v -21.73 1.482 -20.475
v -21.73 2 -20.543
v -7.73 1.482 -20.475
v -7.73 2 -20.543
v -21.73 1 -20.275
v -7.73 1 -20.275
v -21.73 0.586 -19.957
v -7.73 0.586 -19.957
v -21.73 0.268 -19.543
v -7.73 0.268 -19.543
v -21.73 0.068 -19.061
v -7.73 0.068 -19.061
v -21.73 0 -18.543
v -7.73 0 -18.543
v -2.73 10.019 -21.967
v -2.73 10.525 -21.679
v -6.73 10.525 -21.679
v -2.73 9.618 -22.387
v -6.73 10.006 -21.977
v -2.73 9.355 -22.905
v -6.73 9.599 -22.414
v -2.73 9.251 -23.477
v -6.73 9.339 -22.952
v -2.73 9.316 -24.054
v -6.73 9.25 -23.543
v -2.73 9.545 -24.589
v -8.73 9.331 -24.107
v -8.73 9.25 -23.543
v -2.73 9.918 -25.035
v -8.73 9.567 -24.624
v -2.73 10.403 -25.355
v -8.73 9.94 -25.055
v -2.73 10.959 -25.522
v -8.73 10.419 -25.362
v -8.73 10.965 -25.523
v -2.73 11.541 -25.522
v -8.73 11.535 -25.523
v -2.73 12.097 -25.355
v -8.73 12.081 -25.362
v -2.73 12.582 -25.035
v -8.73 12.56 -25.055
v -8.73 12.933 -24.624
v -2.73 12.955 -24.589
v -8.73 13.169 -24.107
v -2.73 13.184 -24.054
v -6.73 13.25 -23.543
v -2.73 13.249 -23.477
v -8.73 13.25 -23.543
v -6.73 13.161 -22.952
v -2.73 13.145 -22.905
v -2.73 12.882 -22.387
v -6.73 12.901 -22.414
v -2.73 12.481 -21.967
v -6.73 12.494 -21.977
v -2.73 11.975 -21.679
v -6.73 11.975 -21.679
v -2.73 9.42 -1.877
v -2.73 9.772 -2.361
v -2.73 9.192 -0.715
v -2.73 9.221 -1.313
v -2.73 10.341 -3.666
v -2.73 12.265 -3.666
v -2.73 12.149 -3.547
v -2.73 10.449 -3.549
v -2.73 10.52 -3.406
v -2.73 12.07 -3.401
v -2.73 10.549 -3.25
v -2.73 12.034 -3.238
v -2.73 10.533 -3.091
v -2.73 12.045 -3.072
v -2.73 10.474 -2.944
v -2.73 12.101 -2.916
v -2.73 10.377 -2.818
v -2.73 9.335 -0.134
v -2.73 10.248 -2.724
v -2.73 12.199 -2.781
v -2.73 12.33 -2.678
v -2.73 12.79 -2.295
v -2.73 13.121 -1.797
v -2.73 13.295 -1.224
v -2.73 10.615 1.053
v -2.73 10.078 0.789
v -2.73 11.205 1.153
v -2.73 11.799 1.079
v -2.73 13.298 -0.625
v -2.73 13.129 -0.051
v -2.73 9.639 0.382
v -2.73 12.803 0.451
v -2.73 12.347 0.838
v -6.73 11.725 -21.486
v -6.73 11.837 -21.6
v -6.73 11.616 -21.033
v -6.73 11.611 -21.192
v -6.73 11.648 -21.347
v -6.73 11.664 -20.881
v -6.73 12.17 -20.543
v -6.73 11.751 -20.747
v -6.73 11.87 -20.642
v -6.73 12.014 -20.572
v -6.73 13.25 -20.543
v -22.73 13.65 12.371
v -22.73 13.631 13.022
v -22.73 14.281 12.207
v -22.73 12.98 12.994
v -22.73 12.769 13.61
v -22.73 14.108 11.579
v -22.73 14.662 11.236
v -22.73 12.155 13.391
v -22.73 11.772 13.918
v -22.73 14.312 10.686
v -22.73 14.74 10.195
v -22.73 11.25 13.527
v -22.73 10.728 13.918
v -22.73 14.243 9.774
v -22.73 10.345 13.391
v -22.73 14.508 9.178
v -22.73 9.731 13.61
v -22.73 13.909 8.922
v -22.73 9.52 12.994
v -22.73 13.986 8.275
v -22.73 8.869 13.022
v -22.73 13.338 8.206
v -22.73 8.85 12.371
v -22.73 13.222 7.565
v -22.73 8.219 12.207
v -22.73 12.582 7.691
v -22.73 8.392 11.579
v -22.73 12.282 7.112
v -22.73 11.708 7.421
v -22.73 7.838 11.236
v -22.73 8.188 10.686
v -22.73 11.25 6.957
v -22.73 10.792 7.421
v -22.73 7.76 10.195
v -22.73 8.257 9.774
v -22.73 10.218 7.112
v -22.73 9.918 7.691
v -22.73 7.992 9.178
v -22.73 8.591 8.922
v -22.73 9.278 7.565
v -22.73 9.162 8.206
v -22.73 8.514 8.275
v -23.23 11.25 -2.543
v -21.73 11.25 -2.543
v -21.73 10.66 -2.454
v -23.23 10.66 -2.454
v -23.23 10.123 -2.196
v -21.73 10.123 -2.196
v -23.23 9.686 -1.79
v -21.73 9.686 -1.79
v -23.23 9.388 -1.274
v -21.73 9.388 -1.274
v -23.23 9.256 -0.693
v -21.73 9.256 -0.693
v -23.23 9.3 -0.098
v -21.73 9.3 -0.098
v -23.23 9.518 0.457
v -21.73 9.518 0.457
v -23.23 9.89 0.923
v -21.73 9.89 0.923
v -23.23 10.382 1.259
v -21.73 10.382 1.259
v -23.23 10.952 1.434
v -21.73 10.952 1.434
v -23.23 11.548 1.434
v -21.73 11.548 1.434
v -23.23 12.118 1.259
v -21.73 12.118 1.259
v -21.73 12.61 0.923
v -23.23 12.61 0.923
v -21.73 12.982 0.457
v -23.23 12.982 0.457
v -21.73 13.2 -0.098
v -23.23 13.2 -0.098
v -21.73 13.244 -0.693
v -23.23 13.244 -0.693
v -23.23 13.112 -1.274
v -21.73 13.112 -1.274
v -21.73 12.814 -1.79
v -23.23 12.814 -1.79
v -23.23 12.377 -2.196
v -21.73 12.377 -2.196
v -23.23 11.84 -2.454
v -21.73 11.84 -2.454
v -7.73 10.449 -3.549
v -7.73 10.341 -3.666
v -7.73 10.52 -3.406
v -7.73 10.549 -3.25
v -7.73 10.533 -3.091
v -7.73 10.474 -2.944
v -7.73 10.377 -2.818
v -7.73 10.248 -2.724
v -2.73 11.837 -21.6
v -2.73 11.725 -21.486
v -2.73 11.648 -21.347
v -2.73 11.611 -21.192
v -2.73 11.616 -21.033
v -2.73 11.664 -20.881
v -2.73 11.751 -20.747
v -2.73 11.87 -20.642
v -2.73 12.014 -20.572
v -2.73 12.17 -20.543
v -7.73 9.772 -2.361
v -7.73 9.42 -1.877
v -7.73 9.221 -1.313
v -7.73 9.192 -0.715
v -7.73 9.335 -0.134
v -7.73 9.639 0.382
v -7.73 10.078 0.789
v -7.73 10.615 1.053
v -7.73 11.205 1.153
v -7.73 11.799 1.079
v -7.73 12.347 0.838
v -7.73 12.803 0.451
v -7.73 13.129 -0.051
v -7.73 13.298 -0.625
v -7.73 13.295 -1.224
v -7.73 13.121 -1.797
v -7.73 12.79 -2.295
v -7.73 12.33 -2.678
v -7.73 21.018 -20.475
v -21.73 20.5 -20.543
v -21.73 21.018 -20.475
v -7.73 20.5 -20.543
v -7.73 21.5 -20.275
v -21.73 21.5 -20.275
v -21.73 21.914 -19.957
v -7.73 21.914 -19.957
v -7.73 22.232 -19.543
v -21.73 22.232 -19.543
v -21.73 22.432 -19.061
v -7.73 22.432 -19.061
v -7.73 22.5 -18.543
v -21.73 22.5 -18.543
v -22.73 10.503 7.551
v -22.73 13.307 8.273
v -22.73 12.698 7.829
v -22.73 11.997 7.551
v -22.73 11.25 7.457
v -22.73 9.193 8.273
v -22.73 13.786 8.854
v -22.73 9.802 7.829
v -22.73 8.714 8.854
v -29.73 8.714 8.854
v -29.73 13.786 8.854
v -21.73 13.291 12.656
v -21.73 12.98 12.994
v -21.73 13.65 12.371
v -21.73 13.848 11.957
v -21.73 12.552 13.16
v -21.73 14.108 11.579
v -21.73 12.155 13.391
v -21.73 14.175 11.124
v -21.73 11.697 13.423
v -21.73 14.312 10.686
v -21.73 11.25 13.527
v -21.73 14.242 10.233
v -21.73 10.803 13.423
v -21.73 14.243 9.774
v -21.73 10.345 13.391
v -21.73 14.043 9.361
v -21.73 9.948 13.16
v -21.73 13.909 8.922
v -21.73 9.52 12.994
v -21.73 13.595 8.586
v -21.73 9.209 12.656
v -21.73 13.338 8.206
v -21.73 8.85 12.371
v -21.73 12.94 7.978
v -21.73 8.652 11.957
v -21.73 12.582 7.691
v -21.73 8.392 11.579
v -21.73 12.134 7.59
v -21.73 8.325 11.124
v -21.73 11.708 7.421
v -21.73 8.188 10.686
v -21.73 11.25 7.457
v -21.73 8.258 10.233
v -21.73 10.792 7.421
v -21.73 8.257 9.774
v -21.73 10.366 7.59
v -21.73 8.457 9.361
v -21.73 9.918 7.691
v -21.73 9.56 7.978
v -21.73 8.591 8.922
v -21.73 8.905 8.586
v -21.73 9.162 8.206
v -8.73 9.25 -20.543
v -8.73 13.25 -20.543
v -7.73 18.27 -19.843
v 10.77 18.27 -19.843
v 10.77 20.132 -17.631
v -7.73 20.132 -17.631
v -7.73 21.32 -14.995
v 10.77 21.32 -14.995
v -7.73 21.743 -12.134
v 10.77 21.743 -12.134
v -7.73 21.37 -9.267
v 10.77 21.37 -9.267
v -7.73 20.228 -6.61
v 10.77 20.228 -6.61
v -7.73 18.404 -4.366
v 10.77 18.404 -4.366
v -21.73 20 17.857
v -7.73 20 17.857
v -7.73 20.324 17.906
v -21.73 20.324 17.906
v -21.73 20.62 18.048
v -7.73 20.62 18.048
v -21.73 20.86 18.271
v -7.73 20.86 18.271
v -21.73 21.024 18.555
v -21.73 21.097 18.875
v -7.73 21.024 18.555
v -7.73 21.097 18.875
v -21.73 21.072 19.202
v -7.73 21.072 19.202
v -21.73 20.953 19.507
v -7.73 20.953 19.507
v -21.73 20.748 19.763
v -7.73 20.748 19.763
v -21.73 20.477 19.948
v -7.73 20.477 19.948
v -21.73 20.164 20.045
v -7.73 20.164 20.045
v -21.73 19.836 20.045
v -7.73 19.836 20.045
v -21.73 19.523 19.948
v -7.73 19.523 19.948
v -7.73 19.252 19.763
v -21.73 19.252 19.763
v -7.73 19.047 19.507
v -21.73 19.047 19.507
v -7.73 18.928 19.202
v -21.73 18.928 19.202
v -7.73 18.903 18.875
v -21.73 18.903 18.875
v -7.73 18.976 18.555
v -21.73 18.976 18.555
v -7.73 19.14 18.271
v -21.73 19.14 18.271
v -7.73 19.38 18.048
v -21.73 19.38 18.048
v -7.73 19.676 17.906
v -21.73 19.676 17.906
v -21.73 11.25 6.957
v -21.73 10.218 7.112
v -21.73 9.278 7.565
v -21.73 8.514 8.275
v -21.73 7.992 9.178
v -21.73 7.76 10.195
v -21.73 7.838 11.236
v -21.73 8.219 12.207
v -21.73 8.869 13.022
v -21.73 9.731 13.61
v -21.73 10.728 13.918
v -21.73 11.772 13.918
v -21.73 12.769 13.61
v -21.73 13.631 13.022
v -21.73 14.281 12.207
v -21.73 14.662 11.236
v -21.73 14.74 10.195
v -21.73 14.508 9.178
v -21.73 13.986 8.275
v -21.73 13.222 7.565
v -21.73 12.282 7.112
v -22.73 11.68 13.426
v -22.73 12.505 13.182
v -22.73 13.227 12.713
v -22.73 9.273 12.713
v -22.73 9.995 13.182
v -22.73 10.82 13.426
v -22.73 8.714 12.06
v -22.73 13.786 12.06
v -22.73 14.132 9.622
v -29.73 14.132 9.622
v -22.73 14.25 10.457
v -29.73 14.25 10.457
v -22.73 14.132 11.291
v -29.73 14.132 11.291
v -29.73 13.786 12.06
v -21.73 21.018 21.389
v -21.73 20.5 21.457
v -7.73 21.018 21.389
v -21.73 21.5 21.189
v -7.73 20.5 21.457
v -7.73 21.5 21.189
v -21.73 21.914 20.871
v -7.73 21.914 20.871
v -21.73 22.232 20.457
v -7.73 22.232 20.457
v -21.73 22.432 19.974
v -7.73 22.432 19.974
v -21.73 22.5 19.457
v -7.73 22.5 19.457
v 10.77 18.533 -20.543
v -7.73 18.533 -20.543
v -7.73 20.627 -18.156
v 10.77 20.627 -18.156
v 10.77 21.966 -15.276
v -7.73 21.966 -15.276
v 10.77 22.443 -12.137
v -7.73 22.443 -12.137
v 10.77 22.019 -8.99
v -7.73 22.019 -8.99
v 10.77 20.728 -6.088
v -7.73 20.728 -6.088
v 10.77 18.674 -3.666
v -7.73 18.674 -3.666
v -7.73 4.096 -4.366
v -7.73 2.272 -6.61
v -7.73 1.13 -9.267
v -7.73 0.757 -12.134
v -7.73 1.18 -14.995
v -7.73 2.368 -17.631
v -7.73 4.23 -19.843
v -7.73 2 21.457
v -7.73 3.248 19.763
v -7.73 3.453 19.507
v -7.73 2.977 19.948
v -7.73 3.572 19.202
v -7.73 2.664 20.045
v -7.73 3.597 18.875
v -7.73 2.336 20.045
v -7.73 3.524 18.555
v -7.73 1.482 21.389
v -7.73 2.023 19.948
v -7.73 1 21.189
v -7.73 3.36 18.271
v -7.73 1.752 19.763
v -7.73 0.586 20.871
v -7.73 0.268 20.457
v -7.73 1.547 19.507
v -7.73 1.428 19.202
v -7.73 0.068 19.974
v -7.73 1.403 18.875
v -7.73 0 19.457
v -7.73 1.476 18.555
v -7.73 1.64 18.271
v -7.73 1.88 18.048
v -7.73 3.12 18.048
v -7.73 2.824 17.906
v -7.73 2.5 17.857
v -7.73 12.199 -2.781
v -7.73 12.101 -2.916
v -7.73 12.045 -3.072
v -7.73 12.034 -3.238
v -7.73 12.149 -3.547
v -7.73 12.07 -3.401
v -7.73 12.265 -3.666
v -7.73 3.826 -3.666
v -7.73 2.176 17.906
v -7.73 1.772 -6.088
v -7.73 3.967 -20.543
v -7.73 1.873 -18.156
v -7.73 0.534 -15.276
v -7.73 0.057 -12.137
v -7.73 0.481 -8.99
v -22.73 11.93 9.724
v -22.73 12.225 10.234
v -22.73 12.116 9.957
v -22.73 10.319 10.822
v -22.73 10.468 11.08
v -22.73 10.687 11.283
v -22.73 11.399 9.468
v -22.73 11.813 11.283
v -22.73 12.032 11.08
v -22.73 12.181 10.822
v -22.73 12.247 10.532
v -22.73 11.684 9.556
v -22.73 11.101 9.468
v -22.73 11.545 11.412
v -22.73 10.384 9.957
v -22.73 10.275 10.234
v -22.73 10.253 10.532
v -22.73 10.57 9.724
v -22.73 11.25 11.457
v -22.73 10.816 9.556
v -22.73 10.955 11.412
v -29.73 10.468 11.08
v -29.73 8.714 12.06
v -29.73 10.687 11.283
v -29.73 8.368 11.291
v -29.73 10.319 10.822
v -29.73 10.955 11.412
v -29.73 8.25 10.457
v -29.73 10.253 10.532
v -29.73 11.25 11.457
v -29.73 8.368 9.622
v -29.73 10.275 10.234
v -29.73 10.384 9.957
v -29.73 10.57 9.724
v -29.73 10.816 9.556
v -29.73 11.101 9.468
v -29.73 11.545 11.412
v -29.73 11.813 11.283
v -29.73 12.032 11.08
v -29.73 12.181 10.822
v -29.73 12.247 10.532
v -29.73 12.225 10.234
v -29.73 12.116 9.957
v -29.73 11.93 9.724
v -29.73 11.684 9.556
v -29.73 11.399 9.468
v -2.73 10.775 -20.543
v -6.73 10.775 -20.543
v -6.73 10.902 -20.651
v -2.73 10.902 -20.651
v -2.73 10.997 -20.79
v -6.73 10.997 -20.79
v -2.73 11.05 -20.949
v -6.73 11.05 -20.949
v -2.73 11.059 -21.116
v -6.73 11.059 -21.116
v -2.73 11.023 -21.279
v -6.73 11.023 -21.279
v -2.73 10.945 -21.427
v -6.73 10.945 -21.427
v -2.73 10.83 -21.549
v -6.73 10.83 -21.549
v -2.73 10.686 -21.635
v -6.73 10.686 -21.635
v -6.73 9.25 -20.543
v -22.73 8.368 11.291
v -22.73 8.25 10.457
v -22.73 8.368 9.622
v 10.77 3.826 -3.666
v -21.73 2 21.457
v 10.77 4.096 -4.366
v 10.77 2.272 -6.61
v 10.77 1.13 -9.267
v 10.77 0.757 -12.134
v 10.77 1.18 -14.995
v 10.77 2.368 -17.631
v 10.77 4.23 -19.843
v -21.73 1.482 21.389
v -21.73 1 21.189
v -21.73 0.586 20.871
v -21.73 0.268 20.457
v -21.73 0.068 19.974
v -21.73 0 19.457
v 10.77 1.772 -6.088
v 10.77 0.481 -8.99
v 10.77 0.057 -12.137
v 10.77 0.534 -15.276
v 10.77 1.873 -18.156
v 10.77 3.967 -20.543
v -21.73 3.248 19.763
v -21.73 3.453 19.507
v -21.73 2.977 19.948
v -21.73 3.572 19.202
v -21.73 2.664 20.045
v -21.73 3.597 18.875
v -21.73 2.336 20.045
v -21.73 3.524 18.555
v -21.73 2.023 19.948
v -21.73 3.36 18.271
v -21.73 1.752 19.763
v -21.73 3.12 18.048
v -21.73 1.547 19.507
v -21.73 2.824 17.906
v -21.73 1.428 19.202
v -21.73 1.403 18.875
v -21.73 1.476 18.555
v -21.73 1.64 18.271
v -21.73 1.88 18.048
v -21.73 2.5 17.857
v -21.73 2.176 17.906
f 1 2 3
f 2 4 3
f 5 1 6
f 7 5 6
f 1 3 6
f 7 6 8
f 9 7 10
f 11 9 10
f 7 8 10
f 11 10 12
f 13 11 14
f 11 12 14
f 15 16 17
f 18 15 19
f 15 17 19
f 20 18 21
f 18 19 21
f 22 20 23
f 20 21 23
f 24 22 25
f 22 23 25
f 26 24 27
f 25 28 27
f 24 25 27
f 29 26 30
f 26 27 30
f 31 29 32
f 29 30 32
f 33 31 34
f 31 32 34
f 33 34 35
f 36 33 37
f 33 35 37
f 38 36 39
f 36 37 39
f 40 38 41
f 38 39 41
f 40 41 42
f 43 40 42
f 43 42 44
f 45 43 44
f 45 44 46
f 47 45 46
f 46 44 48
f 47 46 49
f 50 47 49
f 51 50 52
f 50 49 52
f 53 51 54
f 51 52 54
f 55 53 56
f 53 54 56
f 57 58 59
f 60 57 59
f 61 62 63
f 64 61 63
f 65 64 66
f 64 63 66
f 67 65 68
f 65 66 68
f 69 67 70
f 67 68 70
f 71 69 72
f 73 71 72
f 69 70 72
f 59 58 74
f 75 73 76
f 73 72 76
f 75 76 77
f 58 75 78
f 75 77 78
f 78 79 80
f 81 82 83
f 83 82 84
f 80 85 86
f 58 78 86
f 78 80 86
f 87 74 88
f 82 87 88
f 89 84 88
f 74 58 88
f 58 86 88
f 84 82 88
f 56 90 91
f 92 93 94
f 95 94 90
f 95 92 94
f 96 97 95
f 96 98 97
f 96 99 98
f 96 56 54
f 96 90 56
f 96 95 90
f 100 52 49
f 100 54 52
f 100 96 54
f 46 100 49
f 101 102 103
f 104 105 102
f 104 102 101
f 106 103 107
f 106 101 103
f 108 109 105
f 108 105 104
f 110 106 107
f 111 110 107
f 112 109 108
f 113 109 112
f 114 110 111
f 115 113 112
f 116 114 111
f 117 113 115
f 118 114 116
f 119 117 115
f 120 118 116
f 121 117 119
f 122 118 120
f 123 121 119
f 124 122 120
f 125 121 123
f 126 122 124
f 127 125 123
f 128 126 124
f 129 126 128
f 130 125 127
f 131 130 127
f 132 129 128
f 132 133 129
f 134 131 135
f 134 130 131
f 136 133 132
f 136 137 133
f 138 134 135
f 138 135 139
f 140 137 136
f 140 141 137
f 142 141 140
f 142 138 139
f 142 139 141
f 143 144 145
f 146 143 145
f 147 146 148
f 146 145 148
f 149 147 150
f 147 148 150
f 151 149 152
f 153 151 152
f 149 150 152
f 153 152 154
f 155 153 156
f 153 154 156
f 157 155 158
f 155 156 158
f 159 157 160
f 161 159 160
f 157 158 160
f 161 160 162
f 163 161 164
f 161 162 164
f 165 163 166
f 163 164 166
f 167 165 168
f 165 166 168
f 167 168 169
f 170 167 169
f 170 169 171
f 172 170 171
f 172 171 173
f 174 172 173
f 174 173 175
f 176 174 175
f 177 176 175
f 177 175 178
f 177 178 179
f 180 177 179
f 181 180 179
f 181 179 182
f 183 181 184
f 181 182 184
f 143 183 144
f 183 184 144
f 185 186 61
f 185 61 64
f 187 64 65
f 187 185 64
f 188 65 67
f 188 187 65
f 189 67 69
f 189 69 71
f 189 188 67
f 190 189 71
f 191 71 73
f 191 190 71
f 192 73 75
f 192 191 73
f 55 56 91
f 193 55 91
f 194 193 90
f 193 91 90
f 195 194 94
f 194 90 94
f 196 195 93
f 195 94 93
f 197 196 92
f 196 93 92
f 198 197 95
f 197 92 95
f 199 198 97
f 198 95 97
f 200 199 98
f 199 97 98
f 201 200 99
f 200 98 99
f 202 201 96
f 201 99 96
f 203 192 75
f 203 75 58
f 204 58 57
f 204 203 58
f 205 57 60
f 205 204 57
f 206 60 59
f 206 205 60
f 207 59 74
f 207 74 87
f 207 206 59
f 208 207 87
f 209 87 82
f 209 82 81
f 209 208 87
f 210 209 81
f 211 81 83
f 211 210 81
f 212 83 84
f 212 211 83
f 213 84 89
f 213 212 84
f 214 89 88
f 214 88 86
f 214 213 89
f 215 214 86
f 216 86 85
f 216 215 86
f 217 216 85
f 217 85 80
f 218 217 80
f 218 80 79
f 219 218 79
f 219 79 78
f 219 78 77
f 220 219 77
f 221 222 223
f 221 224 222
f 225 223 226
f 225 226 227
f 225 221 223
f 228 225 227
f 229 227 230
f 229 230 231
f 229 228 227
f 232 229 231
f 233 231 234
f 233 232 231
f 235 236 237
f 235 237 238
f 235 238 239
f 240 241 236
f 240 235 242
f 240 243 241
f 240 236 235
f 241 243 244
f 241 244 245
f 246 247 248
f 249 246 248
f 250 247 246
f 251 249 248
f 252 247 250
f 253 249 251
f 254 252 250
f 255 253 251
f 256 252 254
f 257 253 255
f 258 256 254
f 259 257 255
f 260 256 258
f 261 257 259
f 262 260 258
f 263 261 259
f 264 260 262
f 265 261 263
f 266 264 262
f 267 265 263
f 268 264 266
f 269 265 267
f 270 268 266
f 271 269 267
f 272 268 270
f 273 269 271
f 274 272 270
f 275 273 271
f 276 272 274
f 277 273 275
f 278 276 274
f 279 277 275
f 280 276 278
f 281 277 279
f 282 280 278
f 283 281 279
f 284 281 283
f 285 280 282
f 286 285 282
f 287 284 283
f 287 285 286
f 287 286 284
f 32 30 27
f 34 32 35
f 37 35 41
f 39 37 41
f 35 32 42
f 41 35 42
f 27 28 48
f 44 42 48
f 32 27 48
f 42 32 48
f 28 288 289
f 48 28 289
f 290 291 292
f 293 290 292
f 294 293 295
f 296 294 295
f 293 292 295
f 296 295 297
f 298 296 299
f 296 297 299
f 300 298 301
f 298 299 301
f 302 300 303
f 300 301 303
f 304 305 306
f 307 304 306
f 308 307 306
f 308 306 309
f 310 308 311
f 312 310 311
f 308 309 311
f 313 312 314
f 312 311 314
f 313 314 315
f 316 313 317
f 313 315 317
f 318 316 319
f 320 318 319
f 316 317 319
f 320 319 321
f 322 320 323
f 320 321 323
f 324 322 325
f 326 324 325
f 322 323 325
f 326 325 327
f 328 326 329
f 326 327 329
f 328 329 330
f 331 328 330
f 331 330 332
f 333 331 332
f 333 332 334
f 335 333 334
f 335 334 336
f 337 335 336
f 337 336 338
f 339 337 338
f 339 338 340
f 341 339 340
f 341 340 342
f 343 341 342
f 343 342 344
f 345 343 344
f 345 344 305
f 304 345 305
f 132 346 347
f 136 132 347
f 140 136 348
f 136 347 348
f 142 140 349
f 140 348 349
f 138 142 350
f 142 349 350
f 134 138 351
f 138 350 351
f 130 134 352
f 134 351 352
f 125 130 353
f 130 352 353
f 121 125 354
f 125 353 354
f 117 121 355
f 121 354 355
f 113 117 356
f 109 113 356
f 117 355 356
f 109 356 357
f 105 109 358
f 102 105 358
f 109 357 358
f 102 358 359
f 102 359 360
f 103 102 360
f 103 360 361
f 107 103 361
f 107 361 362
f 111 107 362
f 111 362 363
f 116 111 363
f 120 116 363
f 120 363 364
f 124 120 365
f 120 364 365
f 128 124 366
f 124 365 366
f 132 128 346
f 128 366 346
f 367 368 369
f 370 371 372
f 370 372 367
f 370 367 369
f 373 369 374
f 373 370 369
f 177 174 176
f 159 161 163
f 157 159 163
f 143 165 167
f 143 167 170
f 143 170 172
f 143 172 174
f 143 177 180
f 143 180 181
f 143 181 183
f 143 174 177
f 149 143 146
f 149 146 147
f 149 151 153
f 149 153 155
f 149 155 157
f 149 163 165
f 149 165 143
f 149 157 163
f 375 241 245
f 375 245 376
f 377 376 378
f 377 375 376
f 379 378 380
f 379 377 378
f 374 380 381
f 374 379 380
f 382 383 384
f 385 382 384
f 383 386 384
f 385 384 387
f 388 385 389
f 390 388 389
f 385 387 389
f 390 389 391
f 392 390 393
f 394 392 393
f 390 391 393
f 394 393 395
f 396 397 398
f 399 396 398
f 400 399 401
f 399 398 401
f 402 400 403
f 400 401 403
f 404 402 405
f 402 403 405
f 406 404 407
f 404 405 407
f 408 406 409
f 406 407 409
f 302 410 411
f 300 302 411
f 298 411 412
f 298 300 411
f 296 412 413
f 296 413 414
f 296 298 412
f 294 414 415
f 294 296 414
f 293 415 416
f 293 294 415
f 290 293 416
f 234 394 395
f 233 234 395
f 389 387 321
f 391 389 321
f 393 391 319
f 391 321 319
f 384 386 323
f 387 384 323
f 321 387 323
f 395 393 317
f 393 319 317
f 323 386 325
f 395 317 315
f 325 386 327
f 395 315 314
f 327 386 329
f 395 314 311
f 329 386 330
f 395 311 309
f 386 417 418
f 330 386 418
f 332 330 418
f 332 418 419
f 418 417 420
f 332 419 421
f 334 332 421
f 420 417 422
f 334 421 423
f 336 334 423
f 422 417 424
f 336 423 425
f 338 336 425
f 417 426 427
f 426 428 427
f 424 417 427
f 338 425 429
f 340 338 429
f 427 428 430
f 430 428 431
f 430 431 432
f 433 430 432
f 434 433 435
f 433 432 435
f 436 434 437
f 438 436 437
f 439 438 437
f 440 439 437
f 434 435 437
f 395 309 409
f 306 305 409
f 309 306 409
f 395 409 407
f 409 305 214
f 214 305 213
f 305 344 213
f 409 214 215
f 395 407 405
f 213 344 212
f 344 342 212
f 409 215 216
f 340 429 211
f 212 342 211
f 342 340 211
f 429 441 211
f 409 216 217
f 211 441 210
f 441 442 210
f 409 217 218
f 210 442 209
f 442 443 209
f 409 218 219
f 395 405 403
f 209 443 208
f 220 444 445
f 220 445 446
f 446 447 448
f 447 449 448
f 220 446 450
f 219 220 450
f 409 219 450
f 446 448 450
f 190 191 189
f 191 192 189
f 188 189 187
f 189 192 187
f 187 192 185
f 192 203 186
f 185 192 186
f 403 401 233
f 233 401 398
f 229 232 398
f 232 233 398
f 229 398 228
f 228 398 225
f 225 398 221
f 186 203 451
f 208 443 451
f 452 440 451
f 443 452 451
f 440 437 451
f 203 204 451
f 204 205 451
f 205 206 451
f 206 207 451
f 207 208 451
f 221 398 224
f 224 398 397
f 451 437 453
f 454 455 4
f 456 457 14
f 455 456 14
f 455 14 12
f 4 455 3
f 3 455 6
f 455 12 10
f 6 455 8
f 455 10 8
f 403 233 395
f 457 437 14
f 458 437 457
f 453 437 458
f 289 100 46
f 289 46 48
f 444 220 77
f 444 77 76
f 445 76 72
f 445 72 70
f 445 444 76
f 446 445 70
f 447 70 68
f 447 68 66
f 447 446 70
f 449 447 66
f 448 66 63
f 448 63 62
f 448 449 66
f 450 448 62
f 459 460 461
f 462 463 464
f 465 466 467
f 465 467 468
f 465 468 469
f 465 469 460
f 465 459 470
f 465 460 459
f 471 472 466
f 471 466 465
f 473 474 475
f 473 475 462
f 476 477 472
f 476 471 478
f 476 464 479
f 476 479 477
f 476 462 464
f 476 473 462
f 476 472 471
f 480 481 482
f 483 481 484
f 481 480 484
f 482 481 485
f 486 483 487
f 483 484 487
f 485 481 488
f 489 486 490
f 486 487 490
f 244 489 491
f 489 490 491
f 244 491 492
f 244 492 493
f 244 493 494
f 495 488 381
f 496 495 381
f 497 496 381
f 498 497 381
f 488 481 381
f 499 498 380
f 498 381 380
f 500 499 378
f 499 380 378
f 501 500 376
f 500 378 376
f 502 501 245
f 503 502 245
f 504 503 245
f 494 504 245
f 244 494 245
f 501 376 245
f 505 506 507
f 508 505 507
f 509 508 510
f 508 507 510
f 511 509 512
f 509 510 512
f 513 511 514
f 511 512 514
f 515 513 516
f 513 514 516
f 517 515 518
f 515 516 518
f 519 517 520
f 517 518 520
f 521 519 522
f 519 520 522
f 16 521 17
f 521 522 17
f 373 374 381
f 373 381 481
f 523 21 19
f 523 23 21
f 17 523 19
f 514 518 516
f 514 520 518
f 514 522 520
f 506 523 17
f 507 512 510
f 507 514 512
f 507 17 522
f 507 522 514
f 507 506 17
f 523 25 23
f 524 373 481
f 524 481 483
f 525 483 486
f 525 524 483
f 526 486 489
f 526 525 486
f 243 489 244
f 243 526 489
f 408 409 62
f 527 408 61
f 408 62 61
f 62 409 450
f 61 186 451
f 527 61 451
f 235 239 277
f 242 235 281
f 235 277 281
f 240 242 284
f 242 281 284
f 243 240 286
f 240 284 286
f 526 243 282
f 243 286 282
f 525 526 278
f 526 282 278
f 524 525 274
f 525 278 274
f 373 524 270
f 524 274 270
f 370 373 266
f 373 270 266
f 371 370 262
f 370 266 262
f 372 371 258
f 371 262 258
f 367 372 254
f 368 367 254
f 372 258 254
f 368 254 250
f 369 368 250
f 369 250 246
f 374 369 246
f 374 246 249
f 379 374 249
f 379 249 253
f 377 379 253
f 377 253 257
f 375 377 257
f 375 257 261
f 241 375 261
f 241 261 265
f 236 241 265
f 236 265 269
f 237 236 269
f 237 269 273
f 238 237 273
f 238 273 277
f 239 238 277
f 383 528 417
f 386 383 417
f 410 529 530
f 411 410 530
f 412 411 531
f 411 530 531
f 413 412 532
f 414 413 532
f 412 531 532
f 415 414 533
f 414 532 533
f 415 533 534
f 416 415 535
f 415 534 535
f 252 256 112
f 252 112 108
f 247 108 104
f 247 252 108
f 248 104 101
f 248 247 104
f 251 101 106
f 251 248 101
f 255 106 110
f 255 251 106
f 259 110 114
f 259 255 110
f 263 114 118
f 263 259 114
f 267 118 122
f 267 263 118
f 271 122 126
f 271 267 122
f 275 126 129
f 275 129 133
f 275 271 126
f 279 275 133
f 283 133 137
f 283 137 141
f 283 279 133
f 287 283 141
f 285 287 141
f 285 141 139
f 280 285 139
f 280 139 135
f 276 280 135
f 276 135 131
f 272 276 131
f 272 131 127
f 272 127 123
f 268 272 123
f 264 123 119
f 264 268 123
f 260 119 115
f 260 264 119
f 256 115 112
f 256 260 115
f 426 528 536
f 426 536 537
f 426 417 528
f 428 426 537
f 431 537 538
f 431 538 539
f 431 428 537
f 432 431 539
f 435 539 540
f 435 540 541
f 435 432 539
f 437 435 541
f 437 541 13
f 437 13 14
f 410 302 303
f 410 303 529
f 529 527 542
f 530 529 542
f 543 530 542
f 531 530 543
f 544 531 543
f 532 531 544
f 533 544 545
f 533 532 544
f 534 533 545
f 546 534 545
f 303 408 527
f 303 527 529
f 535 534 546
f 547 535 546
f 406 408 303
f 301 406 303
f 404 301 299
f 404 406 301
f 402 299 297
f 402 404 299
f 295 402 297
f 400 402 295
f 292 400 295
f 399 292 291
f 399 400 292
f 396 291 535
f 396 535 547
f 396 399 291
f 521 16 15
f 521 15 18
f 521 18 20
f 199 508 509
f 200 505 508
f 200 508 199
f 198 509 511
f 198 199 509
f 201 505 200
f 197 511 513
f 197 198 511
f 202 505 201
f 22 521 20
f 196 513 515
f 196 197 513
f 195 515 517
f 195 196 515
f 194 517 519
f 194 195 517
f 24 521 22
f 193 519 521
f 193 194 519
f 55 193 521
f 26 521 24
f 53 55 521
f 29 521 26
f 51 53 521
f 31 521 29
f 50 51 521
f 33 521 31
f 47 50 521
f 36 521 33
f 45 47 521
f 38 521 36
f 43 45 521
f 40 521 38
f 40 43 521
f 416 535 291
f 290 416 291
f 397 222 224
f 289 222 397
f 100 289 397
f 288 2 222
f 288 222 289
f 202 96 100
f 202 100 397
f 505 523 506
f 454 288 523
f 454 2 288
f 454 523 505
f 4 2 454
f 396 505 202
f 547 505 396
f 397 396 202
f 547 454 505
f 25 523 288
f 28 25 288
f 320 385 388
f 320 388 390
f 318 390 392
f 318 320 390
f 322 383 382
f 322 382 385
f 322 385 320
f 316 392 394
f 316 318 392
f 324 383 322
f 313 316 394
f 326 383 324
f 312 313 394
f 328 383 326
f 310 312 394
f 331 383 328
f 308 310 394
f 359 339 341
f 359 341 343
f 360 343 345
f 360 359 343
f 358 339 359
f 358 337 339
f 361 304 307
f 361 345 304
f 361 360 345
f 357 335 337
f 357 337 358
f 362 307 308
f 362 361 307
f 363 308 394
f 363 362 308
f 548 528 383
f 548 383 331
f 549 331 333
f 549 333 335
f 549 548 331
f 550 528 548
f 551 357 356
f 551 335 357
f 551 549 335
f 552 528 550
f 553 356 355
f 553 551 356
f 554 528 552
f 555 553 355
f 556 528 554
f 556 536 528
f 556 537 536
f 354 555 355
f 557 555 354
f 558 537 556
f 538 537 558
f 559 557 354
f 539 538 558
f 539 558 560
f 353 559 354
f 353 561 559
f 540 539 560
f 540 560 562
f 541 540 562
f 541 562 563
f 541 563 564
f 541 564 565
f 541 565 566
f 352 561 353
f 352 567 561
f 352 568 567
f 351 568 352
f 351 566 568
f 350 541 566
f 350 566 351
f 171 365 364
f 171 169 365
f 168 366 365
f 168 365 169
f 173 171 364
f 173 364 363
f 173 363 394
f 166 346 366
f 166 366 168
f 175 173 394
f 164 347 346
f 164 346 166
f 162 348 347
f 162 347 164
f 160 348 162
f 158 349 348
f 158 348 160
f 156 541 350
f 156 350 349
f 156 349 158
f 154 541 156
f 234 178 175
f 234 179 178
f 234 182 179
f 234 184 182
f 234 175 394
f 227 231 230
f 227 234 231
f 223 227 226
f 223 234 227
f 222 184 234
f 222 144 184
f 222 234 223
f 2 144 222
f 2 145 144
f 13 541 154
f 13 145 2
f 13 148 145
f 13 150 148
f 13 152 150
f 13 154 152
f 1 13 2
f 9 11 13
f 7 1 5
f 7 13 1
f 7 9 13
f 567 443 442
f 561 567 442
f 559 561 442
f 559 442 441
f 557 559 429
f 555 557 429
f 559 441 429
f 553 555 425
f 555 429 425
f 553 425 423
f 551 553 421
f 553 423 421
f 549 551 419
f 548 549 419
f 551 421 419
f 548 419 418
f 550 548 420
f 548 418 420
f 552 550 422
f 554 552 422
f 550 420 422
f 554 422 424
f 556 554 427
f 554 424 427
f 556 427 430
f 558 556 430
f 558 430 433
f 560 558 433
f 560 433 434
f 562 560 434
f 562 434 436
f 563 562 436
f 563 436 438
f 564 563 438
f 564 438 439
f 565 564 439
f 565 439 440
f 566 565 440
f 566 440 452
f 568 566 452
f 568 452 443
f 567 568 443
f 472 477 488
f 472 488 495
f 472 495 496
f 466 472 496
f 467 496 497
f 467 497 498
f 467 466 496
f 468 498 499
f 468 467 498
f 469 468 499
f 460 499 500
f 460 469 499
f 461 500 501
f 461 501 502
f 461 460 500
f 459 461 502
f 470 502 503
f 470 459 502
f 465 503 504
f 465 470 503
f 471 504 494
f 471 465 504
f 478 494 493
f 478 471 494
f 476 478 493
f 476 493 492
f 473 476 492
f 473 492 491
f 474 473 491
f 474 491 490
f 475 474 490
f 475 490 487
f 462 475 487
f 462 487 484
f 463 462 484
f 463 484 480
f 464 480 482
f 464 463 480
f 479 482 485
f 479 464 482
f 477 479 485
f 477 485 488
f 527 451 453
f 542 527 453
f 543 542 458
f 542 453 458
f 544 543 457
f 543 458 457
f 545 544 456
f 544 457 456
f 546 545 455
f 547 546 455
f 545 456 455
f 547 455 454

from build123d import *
from build123d.topology import SkipClean

# Parameters (mm, degrees)
SKETCH1_W           = 14
SKETCH1_H           = 42
BOSS_EXTRUDE1_DEPTH = 22.5
FILLET1_R           = 2
BOSS_EXTRUDE2_DEPTH = 18.5
BOSS_EXTRUDE3_DEPTH = 5
SKETCH4_R           = 1.1
CUT_EXTRUDE1_DEPTH  = 15
SKETCH5_W           = 2
SKETCH5_H           = 4
BOSS_EXTRUDE4_DEPTH = 5
BOSS_EXTRUDE5_DEPTH = 4
CUT_EXTRUDE2_START  = -2
CUT_EXTRUDE2_DEPTH  = 2
SKETCH12_R          = 3.5
SKETCH12_R_2        = 3.070336519
BOSS_EXTRUDE6_DEPTH = 1
SKETCH14_R          = 3
BOSS_EXTRUDE7_DEPTH = 1
SKETCH15_R          = 1
BOSS_EXTRUDE8_DEPTH = 7
SKETCH16_R          = 2
BOSS_EXTRUDE9_DEPTH = 1.5
CUT_EXTRUDE3_DEPTH  = 18.5


with BuildPart() as part:
    # Sketch1 → Boss-Extrude1 (new body)
    with BuildSketch(Plane(origin=(0, 0, 0), x_dir=(1, 0, 0), z_dir=(0, 1, 0))):
        with Locations((-14.72963025, -0.456790856)):
            Rectangle(SKETCH1_W, SKETCH1_H)
    extrude(amount=BOSS_EXTRUDE1_DEPTH)

    # Fillet1
    fillet1_edges = [part.edges().sort_by_distance(p)[0] for p in [
        (-14.72963025, 22.5, -20.543209144),
        (-14.72963025, 0, -20.543209144),
        (-14.72963025, 0, 21.456790856),
        (-14.72963025, 22.5, 21.456790856),
    ]]
    fillet(fillet1_edges, radius=FILLET1_R)

    # Sketch2 → Boss-Extrude2 (add)
    with BuildSketch(Plane(origin=(-7.72963025, 0, 0), x_dir=(0, 0, -1), z_dir=(1, 0, 0))):
        with BuildLine():
            Line((3.666133326, 18.67433994), (3.666133326, 3.82566006))
            ThreePointArc((3.666133326, 3.82566006), (12.136760187, 0.056811401), (20.543209144, 3.966716207))
            Line((20.543209144, 3.966716207), (20.543209144, 18.533283793))
            ThreePointArc((20.543209144, 18.533283793), (12.136760187, 22.443188599), (3.666133326, 18.67433994))
        make_face()
    extrude(amount=BOSS_EXTRUDE2_DEPTH)

    # Sketch3 → Boss-Extrude3 (add)
    with BuildSketch(Plane(origin=(-7.72963025, 0, 0), x_dir=(0, 0, -1), z_dir=(1, 0, 0))):
        with BuildLine():
            Line((3.666133326, 12.265446457), (3.666133326, 10.341158941))
            ThreePointArc((3.666133326, 10.341158941), (3.170141933, 10.546427574), (2.72390333, 10.248075799))
            ThreePointArc((2.72390333, 10.248075799), (-1.152649836, 11.204898318), (2.678489822, 12.329861741))
            ThreePointArc((2.678489822, 12.329861741), (3.155102255, 12.033793242), (3.666133326, 12.265446457))
        make_face()
    extrude(amount=BOSS_EXTRUDE3_DEPTH)

    # Sketch4 → Cut-Extrude1 (cut)
    with BuildSketch(Plane(origin=(-7.72963025, 0, 0), x_dir=(0, 0, -1), z_dir=(1, 0, 0))):
        with Locations((-18.956790856, 20)):
            Circle(SKETCH4_R)
        with Locations((-18.956790856, 2.5)):
            Circle(SKETCH4_R)
    extrude(amount=-CUT_EXTRUDE1_DEPTH, mode=Mode.SUBTRACT)

    # Sketch5 → Boss-Extrude4 (add)
    with BuildSketch(Plane(origin=(0, 0, -20.543209144), x_dir=(-1, 0, 0), z_dir=(0, 0, -1))):
        with Locations((7.72963025, 11.25)):
            Rectangle(SKETCH5_W, SKETCH5_H)
    extrude(amount=BOSS_EXTRUDE4_DEPTH)

    # Sketch6 → Boss-Extrude5 (add)
    with BuildSketch(Plane(origin=(-6.72963025, 0, 0), x_dir=(0, 0, -1), z_dir=(1, 0, 0))):
        with BuildLine():
            ThreePointArc((21.679339079, 11.975250565), (21.032871281, 11.616126027), (20.543209144, 12.17031195))
            Line((20.543209144, 12.17031195), (20.543209144, 10.774749435))
            ThreePointArc((20.543209144, 10.774749435), (21.198638933, 11.046780591), (21.679339079, 10.524749435))
            ThreePointArc((21.679339079, 10.524749435), (25.543209144, 11.25), (21.679339079, 11.975250565))
        make_face()
    extrude(amount=BOSS_EXTRUDE5_DEPTH)

    # Sketch7 → Cut-Extrude2 (cut)
    with BuildSketch(Plane(origin=(-6.72963025, 0, 0), x_dir=(0, 0, -1), z_dir=(1, 0, 0)).offset(CUT_EXTRUDE2_START)):
        with BuildLine():
            Line((23.543209144, 13.25), (23.543209144, 13.967200788))
            Line((23.543209144, 13.967200788), (25.760178749, 13.967200788))
            Line((25.760178749, 13.967200788), (25.760178749, 8.970470958))
            Line((25.760178749, 8.970470958), (23.543209144, 8.970470958))
            Line((23.543209144, 8.970470958), (23.543209144, 9.25))
            ThreePointArc((23.543209144, 9.25), (25.543209144, 11.25), (23.543209144, 13.25))
        make_face()
    extrude(amount=CUT_EXTRUDE2_DEPTH, mode=Mode.SUBTRACT)

    # Sketch12 → Boss-Extrude6 (add)
    with BuildSketch(Plane.ZY.offset(21.72963025)):
        with Locations(Location((10.456790856, 11.25, 0), (0, 0, 180))):
            Circle(SKETCH12_R)
        with Locations((10.456790856, 11.25)):
            Circle(SKETCH12_R_2, mode=Mode.SUBTRACT)
    extrude(amount=BOSS_EXTRUDE6_DEPTH)

    # Sketch14 → Boss-Extrude7 (add)
    with BuildSketch(Plane.ZY.offset(21.72963025)):
        with Locations(Location((10.456790856, 11.25, 0), (0, 0, 180))):
            Circle(SKETCH14_R)
    extrude(amount=BOSS_EXTRUDE7_DEPTH)

    # Sketch15 → Boss-Extrude8 (add)
    with SkipClean():  # the faces are left unmerged after this step: merging them gives an invalid solid
        with BuildSketch(Plane.ZY.offset(22.72963025)):
            with BuildLine():
                Line((8.853884636, 8.714119157), (8.853884636, 13.785880843))
                ThreePointArc((8.853884636, 13.785880843), (10.456790856, 14.25), (12.059697077, 13.785880843))
                Line((12.059697077, 13.785880843), (12.059697077, 8.714119157))
                ThreePointArc((12.059697077, 8.714119157), (10.456790856, 8.25), (8.853884636, 8.714119157))
            make_face()
            with Locations((10.456790856, 11.25)):
                Circle(SKETCH15_R, mode=Mode.SUBTRACT)
        extrude(amount=BOSS_EXTRUDE8_DEPTH)

    # Sketch16 → Boss-Extrude9 (add)
    with SkipClean():  # the faces are left unmerged after this step: merging them gives an invalid solid
        with BuildSketch(Plane.ZY.offset(21.72963025)):
            with Locations(Location((-0.543209144, 11.25, 0), (0, 0, 180))):
                Circle(SKETCH16_R)
        extrude(amount=BOSS_EXTRUDE9_DEPTH)

    # Sketch17 → Cut-Extrude3 (cut)
    with SkipClean():  # the faces are left unmerged after this step: merging them gives an invalid solid
        with BuildSketch(Plane(origin=(10.77036975, 0, 0), x_dir=(0, 0, -1), z_dir=(1, 0, 0))):
            with BuildLine():
                Line((19.843209144, 4.230369564), (19.843209144, 18.269630436))
                ThreePointArc((19.843209144, 18.269630436), (12.134214683, 21.743184905), (4.366133326, 18.403860381))
                Line((4.366133326, 18.403860381), (4.366133326, 4.096139619))
                ThreePointArc((4.366133326, 4.096139619), (12.134214683, 0.756815095), (19.843209144, 4.230369564))
            make_face()
        extrude(amount=-CUT_EXTRUDE3_DEPTH, mode=Mode.SUBTRACT)


solid = part.part
